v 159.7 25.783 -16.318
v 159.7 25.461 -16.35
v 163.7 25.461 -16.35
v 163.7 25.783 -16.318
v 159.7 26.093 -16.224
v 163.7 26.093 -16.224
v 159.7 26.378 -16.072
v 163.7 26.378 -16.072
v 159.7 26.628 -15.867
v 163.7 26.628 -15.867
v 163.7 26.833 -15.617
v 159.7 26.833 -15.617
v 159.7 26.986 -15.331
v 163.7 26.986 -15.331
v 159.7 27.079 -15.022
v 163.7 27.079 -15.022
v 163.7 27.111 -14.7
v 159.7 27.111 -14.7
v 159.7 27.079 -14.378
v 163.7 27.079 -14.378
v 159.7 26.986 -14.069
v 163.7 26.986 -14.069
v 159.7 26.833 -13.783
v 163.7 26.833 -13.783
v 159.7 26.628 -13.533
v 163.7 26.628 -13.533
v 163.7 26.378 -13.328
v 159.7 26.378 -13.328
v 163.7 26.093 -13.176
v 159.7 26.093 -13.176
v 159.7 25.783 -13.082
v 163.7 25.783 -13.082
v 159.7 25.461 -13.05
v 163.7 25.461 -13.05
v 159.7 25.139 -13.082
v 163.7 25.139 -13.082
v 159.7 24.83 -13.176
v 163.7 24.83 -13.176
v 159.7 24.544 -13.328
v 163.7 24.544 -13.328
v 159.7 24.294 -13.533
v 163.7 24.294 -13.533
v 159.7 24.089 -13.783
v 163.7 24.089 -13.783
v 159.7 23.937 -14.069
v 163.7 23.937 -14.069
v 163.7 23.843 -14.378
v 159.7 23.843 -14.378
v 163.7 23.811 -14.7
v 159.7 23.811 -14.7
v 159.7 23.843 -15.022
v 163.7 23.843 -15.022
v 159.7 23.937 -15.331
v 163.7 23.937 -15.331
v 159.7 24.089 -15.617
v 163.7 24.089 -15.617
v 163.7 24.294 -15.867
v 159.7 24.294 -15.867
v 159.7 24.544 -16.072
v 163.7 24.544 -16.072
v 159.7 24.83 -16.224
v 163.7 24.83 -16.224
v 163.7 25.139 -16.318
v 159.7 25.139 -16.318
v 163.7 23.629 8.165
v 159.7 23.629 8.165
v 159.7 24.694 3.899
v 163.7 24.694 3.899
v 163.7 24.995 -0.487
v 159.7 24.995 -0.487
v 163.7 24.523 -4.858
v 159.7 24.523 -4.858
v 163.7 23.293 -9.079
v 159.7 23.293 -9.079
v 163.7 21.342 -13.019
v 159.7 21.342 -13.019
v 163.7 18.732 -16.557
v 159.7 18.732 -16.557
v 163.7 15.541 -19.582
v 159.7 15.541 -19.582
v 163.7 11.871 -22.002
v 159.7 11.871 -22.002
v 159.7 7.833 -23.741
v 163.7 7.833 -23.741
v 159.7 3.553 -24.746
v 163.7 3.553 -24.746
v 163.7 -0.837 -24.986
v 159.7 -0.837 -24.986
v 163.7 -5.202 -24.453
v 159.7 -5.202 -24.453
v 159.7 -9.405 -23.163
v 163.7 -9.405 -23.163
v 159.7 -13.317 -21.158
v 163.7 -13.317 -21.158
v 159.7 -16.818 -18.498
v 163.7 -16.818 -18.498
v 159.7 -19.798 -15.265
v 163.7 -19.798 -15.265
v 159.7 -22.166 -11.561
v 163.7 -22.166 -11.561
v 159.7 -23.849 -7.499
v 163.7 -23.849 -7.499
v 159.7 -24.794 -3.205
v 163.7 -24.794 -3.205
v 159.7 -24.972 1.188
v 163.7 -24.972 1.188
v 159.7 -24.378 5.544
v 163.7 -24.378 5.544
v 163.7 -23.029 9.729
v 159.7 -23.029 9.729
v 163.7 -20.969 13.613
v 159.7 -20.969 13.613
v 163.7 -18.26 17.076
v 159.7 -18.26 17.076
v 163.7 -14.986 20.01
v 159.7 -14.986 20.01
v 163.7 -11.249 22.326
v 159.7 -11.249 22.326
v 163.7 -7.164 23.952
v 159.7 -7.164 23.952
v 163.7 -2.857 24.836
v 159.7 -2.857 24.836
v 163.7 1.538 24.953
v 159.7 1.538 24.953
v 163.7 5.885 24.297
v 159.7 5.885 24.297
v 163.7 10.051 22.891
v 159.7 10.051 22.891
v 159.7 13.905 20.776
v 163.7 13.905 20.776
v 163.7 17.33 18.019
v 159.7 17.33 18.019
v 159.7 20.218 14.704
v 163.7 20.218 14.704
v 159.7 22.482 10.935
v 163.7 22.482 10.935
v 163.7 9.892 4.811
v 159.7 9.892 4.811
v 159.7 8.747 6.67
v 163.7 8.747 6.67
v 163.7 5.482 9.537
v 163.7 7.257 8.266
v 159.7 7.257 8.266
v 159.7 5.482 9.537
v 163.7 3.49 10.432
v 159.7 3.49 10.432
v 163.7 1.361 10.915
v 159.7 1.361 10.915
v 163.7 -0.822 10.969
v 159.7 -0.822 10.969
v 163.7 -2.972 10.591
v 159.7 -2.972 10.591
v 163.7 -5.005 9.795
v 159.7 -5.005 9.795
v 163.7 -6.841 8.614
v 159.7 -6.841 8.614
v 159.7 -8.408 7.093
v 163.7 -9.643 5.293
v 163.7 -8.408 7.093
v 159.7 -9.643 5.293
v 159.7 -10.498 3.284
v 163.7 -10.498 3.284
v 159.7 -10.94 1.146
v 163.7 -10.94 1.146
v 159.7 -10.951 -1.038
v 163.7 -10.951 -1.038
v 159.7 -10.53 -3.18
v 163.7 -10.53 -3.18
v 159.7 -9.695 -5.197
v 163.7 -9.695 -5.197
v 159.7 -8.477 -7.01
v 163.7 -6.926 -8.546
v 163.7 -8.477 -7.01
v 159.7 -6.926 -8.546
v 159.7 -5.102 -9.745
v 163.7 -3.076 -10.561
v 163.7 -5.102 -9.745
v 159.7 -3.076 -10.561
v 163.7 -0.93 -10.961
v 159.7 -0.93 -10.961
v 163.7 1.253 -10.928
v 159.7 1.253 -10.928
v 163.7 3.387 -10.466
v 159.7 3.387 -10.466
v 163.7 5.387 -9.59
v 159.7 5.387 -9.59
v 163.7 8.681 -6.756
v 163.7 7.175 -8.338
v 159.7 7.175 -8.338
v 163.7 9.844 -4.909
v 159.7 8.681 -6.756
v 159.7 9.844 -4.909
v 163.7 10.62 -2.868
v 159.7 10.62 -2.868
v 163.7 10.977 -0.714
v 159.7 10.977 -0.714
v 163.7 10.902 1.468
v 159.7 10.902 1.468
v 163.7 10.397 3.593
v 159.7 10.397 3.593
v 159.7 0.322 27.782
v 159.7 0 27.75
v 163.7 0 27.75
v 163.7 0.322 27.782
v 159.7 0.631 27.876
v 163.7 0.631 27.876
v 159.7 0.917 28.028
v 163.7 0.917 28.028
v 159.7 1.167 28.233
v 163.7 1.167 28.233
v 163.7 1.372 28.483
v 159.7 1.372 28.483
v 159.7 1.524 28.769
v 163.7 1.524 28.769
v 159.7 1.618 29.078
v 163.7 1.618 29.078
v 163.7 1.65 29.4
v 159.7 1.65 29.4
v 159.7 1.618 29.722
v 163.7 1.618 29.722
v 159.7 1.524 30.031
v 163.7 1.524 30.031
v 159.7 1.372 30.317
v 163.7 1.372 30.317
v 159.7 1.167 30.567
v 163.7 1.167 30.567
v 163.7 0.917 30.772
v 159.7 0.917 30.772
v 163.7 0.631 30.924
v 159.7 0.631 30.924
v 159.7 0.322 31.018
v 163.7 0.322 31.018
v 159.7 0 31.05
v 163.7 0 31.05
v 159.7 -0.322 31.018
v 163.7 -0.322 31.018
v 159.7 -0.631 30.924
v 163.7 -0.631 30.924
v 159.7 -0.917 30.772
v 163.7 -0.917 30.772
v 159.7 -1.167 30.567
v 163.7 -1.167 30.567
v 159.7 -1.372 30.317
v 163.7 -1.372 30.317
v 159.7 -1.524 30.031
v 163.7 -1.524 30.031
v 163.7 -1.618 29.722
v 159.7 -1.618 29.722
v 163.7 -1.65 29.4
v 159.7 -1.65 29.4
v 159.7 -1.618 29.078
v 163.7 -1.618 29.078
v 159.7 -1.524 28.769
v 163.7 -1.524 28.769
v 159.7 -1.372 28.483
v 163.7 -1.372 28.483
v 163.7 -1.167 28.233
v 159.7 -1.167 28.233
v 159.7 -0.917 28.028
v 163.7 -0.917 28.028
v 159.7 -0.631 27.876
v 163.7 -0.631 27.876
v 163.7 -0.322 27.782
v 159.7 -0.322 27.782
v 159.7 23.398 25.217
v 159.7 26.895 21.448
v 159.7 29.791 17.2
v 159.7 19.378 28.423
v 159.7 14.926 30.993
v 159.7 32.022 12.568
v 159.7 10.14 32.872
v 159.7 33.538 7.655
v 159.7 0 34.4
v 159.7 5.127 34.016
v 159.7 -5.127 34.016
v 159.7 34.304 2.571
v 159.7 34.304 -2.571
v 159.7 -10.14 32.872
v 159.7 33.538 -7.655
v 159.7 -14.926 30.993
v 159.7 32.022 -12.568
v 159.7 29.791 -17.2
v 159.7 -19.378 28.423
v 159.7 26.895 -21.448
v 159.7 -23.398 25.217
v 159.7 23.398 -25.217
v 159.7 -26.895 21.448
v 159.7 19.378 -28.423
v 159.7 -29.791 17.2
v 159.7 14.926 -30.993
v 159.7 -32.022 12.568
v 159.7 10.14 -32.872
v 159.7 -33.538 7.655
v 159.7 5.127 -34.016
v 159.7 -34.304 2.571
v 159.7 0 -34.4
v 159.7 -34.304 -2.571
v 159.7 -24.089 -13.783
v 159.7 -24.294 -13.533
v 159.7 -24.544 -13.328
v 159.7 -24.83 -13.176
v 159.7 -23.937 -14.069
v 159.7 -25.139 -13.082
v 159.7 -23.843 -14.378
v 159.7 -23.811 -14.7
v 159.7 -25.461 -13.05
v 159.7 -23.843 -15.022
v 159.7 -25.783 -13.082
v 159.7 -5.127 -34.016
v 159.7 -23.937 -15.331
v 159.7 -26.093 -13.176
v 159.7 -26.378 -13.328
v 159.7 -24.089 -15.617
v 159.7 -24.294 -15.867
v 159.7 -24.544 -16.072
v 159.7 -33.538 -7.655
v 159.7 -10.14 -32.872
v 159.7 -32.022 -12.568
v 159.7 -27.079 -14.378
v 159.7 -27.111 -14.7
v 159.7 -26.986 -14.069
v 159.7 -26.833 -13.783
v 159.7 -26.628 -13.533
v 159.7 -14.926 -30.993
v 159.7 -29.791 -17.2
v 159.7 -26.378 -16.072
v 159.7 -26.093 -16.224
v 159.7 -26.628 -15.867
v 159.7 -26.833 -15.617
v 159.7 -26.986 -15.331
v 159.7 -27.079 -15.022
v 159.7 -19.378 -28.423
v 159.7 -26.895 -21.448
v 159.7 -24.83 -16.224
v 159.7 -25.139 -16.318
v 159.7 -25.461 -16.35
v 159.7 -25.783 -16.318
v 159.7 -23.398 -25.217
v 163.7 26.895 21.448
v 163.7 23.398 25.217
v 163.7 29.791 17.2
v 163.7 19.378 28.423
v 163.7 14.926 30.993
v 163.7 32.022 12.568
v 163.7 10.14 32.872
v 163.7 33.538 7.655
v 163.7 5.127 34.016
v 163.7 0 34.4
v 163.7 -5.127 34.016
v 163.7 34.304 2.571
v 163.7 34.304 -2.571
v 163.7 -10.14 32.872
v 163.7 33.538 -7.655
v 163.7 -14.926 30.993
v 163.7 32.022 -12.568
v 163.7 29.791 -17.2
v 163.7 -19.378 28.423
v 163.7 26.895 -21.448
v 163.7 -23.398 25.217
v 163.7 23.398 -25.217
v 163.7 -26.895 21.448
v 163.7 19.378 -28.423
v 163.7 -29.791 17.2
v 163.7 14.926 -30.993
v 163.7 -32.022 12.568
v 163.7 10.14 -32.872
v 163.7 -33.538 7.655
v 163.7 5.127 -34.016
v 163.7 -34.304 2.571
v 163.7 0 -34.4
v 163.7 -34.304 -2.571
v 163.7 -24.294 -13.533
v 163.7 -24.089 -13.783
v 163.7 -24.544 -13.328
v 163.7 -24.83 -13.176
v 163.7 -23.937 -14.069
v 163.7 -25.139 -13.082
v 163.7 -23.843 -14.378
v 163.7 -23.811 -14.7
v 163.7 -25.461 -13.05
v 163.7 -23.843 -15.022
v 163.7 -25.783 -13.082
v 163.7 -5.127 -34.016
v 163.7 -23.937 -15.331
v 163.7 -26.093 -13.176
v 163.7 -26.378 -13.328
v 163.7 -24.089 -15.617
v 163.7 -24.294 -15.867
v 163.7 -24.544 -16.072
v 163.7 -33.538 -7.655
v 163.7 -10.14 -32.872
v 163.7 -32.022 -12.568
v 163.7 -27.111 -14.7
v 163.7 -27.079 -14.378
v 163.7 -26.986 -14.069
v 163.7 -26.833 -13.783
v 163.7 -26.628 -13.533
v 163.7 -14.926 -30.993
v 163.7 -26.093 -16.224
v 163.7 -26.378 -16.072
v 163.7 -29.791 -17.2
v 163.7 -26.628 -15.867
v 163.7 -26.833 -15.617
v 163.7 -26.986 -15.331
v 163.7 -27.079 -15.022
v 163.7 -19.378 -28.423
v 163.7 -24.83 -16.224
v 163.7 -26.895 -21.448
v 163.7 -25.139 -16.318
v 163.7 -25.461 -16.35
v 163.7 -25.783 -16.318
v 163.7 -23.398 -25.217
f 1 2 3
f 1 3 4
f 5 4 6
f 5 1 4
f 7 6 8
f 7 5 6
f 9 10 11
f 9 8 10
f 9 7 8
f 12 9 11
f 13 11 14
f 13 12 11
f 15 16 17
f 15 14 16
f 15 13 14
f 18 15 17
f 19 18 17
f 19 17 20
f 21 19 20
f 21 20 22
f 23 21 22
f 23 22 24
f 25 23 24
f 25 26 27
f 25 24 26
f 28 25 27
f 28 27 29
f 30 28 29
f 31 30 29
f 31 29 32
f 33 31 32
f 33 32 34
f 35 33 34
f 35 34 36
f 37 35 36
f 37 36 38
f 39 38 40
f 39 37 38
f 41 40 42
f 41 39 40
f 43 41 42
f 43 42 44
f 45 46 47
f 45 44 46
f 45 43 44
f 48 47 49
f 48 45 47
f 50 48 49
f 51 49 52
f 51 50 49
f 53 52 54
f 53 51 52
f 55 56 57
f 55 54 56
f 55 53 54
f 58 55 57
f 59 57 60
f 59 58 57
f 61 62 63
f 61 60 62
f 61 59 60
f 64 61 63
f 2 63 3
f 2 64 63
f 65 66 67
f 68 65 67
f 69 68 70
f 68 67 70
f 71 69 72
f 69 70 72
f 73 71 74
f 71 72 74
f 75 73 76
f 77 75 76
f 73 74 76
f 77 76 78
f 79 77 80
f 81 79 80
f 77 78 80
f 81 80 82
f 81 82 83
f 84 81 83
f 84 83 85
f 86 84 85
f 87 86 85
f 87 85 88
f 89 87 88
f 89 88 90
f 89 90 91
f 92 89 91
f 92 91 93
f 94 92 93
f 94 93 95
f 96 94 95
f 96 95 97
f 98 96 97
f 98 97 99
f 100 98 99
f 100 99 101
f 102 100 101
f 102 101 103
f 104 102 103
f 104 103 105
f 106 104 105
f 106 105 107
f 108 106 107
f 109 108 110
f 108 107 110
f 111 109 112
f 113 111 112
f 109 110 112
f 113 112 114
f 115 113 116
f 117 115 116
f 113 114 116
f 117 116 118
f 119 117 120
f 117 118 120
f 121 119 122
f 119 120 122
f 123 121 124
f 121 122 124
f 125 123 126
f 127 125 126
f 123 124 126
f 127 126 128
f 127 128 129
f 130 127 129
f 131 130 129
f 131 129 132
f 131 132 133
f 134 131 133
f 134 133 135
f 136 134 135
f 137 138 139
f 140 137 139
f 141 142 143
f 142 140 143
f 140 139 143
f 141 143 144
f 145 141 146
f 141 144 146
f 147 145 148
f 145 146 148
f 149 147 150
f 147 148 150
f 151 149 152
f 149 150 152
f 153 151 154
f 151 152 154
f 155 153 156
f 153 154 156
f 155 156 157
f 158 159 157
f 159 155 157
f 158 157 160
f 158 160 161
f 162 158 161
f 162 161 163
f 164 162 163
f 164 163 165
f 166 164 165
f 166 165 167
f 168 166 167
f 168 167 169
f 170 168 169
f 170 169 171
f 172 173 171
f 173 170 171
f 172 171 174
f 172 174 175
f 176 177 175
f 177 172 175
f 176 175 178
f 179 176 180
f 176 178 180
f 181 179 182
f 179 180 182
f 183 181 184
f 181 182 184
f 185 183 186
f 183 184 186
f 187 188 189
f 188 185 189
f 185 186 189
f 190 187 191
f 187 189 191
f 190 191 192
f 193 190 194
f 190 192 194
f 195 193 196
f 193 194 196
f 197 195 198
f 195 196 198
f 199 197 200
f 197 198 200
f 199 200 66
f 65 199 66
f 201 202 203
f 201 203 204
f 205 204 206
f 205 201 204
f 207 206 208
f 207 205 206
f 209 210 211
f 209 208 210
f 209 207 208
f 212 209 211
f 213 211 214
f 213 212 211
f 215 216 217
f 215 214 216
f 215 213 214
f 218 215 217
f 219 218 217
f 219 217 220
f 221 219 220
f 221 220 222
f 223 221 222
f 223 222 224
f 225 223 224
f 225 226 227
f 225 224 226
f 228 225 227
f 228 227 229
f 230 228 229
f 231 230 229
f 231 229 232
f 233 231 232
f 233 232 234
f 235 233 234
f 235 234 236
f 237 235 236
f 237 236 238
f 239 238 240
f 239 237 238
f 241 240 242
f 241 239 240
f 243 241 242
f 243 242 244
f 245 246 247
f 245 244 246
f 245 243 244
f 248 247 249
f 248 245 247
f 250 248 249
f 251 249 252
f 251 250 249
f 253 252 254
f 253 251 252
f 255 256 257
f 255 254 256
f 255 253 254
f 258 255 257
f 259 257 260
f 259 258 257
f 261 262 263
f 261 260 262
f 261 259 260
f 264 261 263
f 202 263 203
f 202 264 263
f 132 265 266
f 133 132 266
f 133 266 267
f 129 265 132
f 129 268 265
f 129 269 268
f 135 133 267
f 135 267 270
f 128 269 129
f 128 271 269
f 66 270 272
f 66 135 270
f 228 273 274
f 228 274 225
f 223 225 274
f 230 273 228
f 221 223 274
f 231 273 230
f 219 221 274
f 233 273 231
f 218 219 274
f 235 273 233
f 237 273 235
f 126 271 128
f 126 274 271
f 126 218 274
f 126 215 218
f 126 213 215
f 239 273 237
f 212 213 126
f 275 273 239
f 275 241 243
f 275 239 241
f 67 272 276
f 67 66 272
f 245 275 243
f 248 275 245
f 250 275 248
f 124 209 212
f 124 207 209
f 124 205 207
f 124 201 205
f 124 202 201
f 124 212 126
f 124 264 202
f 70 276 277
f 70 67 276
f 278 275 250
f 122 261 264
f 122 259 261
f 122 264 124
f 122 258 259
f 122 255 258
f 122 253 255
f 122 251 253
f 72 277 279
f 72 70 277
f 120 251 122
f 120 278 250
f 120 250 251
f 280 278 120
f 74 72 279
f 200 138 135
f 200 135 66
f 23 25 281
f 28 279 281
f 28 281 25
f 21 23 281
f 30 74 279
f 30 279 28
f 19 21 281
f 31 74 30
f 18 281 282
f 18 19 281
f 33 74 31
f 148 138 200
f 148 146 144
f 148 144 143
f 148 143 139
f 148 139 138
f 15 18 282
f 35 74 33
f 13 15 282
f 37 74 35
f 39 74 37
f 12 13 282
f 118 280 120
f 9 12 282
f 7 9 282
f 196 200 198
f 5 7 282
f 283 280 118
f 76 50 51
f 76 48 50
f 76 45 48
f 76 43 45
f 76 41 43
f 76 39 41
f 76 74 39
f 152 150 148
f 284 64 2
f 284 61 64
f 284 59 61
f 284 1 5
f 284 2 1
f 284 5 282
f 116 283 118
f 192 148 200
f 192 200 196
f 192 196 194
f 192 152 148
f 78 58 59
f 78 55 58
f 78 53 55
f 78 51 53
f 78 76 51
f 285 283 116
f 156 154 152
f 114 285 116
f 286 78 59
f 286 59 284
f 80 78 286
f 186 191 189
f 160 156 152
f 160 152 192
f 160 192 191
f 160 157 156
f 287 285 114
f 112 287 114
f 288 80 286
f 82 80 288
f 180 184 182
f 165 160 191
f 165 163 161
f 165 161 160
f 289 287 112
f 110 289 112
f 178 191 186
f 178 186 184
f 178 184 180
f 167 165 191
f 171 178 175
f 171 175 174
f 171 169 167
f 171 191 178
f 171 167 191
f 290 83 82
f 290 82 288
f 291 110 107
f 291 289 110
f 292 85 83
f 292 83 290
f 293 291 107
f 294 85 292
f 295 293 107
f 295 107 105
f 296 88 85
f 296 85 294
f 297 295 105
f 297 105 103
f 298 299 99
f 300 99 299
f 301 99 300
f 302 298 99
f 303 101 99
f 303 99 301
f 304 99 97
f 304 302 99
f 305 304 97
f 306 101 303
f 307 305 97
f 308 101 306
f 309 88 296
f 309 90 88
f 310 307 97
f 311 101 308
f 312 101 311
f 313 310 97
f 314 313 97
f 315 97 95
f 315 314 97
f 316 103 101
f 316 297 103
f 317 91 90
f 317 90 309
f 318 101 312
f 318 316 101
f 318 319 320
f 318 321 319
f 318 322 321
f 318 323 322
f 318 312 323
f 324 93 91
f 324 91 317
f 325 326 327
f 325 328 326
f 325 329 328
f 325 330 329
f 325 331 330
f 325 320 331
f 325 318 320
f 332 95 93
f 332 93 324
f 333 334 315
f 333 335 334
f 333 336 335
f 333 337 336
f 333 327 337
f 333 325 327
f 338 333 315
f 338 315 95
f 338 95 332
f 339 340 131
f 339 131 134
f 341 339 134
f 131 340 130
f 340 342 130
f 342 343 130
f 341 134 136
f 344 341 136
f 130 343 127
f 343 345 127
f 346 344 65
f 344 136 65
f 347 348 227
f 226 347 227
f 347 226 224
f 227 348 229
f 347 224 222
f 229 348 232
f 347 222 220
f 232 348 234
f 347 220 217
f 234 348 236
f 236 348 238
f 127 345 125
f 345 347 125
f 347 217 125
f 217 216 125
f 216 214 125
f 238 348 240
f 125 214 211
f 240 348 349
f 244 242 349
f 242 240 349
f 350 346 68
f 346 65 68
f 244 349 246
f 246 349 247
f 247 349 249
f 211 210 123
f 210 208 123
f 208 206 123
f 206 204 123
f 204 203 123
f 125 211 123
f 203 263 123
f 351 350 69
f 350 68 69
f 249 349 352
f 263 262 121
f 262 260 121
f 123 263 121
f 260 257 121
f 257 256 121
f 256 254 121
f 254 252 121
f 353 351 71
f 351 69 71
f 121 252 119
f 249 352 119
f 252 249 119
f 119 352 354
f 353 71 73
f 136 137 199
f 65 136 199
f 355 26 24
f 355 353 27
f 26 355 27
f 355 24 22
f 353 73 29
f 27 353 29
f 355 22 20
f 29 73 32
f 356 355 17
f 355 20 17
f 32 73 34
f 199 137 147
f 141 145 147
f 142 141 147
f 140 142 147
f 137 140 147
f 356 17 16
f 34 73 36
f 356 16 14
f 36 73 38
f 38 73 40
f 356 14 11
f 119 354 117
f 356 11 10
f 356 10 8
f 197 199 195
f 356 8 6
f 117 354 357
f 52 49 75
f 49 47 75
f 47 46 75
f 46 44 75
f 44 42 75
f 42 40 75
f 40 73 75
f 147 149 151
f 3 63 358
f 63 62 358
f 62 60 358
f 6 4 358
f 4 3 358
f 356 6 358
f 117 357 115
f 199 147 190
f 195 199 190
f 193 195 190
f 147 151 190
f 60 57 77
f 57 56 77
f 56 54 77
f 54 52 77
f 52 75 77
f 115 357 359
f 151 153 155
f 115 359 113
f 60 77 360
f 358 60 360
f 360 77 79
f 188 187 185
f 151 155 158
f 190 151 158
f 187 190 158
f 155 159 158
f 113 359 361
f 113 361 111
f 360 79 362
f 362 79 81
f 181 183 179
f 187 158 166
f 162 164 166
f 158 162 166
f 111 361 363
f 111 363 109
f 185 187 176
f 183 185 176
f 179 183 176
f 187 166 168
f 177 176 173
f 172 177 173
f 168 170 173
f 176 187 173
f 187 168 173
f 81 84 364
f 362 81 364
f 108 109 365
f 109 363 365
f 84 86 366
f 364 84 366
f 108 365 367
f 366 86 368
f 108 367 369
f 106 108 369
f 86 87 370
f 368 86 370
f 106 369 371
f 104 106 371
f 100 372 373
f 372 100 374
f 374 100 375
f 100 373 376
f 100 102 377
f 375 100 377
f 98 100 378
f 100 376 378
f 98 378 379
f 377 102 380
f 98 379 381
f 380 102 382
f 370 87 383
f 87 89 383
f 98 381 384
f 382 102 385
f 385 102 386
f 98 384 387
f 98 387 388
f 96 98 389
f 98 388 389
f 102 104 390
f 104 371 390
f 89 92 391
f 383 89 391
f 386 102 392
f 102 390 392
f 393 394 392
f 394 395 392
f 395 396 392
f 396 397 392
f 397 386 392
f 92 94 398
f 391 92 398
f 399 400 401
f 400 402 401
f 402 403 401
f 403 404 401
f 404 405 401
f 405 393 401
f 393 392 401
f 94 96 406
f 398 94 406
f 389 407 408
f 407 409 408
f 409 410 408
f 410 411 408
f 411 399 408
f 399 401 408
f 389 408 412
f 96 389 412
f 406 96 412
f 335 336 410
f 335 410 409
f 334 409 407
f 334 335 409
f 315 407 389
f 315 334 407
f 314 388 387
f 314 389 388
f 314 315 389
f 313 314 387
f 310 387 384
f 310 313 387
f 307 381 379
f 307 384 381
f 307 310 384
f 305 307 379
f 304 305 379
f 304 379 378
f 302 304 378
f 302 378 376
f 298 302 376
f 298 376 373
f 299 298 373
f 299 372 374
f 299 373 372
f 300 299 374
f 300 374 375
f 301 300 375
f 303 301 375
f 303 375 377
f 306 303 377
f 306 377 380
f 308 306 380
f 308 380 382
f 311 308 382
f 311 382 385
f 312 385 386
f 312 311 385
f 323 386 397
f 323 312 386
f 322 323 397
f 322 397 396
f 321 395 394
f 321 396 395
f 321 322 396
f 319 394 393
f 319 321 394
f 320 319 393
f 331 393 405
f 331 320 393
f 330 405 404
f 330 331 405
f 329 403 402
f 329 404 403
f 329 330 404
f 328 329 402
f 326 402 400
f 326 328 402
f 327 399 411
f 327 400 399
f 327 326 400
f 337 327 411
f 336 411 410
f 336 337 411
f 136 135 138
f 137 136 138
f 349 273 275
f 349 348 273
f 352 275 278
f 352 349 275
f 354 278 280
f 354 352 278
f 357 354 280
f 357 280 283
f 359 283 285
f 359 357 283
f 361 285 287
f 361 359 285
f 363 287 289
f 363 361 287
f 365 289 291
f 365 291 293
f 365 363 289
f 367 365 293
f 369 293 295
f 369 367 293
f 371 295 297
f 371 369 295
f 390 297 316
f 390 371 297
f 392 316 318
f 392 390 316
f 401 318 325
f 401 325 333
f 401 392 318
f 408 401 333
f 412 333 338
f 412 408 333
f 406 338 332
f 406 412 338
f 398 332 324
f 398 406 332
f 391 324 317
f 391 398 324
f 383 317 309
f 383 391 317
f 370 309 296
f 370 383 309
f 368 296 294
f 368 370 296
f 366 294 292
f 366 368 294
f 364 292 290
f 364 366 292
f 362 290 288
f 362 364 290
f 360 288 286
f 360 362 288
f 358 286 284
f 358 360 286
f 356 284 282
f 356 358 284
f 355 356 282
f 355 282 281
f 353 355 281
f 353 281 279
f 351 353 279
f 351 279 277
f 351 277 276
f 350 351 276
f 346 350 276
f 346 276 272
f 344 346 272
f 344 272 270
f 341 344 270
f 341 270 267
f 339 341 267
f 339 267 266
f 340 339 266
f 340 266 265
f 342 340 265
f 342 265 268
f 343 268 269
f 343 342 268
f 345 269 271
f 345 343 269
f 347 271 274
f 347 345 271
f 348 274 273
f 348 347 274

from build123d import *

# Parameters (mm, degrees)
AXIAL_PROFILE_MM_W                                  = 4
AXIAL_PROFILE_MM_H                                  = 34.4
AXIAL_HOLES_DEPTH                                   = 171.775905795
AXIAL_HOLES_DEPTH_BACK                              = 171.775905795
SKETCH2_R                                           = 1.65
C_SHAPED_COOLANT_PASSAGE_AND_INTEGRAL_DI_DEPTH      = 171.775905795
C_SHAPED_COOLANT_PASSAGE_AND_INTEGRAL_DI_DEPTH_BACK = 171.775905795


with BuildPart() as part:
    # Axial profile (mm) → Full revolution (revolve)
    with BuildSketch(Plane.XY, mode=Mode.PRIVATE) as full_revolution_sk:
        with Locations((161.7, 17.2)):
            Rectangle(AXIAL_PROFILE_MM_W, AXIAL_PROFILE_MM_H)
    revolve(full_revolution_sk.sketch.rotate(Axis((-110, 0, 0), (1, 0, 0)), 90), axis=Axis((-110, 0, 0), (1, 0, 0)))

    # Sketch2 → Axial holes (cut, two sides: drawn at the far end of the back side and taken through both)
    with BuildSketch(Plane(origin=(0, 0, 0), x_dir=(0, 0, -1), z_dir=(1, 0, 0)).offset(-AXIAL_HOLES_DEPTH_BACK)):
        with Locations((-29.4, 0)):
            Circle(SKETCH2_R)
        with Locations((14.7, -25.461146871)):
            Circle(SKETCH2_R)
        with Locations((14.7, 25.461146871)):
            Circle(SKETCH2_R)
    extrude(amount=AXIAL_HOLES_DEPTH + AXIAL_HOLES_DEPTH_BACK, mode=Mode.SUBTRACT)

    # Sketch3 → C-shaped coolant passage and integral divider (cut, two sides: drawn at the far end of the back side and taken through both)
    with BuildSketch(Plane(origin=(0, 0, 0), x_dir=(0, 0, -1), z_dir=(1, 0, 0)).offset(-C_SHAPED_COOLANT_PASSAGE_AND_INTEGRAL_DI_DEPTH_BACK)):
        with BuildLine():
            Line((-10.934858177, 22.481745409), (-4.811337598, 9.89196798))
            ThreePointArc((-4.811337598, 9.89196798), (4.209517756, -10.162674858), (-3.592548196, 10.39680708))
            Line((-3.592548196, 10.39680708), (-8.164882263, 23.629107))
            ThreePointArc((-8.164882263, 23.629107), (9.567085809, -23.096988313), (-10.934858177, 22.481745409))
        make_face()
    extrude(amount=C_SHAPED_COOLANT_PASSAGE_AND_INTEGRAL_DI_DEPTH + C_SHAPED_COOLANT_PASSAGE_AND_INTEGRAL_DI_DEPTH_BACK, mode=Mode.SUBTRACT)


solid = part.part
